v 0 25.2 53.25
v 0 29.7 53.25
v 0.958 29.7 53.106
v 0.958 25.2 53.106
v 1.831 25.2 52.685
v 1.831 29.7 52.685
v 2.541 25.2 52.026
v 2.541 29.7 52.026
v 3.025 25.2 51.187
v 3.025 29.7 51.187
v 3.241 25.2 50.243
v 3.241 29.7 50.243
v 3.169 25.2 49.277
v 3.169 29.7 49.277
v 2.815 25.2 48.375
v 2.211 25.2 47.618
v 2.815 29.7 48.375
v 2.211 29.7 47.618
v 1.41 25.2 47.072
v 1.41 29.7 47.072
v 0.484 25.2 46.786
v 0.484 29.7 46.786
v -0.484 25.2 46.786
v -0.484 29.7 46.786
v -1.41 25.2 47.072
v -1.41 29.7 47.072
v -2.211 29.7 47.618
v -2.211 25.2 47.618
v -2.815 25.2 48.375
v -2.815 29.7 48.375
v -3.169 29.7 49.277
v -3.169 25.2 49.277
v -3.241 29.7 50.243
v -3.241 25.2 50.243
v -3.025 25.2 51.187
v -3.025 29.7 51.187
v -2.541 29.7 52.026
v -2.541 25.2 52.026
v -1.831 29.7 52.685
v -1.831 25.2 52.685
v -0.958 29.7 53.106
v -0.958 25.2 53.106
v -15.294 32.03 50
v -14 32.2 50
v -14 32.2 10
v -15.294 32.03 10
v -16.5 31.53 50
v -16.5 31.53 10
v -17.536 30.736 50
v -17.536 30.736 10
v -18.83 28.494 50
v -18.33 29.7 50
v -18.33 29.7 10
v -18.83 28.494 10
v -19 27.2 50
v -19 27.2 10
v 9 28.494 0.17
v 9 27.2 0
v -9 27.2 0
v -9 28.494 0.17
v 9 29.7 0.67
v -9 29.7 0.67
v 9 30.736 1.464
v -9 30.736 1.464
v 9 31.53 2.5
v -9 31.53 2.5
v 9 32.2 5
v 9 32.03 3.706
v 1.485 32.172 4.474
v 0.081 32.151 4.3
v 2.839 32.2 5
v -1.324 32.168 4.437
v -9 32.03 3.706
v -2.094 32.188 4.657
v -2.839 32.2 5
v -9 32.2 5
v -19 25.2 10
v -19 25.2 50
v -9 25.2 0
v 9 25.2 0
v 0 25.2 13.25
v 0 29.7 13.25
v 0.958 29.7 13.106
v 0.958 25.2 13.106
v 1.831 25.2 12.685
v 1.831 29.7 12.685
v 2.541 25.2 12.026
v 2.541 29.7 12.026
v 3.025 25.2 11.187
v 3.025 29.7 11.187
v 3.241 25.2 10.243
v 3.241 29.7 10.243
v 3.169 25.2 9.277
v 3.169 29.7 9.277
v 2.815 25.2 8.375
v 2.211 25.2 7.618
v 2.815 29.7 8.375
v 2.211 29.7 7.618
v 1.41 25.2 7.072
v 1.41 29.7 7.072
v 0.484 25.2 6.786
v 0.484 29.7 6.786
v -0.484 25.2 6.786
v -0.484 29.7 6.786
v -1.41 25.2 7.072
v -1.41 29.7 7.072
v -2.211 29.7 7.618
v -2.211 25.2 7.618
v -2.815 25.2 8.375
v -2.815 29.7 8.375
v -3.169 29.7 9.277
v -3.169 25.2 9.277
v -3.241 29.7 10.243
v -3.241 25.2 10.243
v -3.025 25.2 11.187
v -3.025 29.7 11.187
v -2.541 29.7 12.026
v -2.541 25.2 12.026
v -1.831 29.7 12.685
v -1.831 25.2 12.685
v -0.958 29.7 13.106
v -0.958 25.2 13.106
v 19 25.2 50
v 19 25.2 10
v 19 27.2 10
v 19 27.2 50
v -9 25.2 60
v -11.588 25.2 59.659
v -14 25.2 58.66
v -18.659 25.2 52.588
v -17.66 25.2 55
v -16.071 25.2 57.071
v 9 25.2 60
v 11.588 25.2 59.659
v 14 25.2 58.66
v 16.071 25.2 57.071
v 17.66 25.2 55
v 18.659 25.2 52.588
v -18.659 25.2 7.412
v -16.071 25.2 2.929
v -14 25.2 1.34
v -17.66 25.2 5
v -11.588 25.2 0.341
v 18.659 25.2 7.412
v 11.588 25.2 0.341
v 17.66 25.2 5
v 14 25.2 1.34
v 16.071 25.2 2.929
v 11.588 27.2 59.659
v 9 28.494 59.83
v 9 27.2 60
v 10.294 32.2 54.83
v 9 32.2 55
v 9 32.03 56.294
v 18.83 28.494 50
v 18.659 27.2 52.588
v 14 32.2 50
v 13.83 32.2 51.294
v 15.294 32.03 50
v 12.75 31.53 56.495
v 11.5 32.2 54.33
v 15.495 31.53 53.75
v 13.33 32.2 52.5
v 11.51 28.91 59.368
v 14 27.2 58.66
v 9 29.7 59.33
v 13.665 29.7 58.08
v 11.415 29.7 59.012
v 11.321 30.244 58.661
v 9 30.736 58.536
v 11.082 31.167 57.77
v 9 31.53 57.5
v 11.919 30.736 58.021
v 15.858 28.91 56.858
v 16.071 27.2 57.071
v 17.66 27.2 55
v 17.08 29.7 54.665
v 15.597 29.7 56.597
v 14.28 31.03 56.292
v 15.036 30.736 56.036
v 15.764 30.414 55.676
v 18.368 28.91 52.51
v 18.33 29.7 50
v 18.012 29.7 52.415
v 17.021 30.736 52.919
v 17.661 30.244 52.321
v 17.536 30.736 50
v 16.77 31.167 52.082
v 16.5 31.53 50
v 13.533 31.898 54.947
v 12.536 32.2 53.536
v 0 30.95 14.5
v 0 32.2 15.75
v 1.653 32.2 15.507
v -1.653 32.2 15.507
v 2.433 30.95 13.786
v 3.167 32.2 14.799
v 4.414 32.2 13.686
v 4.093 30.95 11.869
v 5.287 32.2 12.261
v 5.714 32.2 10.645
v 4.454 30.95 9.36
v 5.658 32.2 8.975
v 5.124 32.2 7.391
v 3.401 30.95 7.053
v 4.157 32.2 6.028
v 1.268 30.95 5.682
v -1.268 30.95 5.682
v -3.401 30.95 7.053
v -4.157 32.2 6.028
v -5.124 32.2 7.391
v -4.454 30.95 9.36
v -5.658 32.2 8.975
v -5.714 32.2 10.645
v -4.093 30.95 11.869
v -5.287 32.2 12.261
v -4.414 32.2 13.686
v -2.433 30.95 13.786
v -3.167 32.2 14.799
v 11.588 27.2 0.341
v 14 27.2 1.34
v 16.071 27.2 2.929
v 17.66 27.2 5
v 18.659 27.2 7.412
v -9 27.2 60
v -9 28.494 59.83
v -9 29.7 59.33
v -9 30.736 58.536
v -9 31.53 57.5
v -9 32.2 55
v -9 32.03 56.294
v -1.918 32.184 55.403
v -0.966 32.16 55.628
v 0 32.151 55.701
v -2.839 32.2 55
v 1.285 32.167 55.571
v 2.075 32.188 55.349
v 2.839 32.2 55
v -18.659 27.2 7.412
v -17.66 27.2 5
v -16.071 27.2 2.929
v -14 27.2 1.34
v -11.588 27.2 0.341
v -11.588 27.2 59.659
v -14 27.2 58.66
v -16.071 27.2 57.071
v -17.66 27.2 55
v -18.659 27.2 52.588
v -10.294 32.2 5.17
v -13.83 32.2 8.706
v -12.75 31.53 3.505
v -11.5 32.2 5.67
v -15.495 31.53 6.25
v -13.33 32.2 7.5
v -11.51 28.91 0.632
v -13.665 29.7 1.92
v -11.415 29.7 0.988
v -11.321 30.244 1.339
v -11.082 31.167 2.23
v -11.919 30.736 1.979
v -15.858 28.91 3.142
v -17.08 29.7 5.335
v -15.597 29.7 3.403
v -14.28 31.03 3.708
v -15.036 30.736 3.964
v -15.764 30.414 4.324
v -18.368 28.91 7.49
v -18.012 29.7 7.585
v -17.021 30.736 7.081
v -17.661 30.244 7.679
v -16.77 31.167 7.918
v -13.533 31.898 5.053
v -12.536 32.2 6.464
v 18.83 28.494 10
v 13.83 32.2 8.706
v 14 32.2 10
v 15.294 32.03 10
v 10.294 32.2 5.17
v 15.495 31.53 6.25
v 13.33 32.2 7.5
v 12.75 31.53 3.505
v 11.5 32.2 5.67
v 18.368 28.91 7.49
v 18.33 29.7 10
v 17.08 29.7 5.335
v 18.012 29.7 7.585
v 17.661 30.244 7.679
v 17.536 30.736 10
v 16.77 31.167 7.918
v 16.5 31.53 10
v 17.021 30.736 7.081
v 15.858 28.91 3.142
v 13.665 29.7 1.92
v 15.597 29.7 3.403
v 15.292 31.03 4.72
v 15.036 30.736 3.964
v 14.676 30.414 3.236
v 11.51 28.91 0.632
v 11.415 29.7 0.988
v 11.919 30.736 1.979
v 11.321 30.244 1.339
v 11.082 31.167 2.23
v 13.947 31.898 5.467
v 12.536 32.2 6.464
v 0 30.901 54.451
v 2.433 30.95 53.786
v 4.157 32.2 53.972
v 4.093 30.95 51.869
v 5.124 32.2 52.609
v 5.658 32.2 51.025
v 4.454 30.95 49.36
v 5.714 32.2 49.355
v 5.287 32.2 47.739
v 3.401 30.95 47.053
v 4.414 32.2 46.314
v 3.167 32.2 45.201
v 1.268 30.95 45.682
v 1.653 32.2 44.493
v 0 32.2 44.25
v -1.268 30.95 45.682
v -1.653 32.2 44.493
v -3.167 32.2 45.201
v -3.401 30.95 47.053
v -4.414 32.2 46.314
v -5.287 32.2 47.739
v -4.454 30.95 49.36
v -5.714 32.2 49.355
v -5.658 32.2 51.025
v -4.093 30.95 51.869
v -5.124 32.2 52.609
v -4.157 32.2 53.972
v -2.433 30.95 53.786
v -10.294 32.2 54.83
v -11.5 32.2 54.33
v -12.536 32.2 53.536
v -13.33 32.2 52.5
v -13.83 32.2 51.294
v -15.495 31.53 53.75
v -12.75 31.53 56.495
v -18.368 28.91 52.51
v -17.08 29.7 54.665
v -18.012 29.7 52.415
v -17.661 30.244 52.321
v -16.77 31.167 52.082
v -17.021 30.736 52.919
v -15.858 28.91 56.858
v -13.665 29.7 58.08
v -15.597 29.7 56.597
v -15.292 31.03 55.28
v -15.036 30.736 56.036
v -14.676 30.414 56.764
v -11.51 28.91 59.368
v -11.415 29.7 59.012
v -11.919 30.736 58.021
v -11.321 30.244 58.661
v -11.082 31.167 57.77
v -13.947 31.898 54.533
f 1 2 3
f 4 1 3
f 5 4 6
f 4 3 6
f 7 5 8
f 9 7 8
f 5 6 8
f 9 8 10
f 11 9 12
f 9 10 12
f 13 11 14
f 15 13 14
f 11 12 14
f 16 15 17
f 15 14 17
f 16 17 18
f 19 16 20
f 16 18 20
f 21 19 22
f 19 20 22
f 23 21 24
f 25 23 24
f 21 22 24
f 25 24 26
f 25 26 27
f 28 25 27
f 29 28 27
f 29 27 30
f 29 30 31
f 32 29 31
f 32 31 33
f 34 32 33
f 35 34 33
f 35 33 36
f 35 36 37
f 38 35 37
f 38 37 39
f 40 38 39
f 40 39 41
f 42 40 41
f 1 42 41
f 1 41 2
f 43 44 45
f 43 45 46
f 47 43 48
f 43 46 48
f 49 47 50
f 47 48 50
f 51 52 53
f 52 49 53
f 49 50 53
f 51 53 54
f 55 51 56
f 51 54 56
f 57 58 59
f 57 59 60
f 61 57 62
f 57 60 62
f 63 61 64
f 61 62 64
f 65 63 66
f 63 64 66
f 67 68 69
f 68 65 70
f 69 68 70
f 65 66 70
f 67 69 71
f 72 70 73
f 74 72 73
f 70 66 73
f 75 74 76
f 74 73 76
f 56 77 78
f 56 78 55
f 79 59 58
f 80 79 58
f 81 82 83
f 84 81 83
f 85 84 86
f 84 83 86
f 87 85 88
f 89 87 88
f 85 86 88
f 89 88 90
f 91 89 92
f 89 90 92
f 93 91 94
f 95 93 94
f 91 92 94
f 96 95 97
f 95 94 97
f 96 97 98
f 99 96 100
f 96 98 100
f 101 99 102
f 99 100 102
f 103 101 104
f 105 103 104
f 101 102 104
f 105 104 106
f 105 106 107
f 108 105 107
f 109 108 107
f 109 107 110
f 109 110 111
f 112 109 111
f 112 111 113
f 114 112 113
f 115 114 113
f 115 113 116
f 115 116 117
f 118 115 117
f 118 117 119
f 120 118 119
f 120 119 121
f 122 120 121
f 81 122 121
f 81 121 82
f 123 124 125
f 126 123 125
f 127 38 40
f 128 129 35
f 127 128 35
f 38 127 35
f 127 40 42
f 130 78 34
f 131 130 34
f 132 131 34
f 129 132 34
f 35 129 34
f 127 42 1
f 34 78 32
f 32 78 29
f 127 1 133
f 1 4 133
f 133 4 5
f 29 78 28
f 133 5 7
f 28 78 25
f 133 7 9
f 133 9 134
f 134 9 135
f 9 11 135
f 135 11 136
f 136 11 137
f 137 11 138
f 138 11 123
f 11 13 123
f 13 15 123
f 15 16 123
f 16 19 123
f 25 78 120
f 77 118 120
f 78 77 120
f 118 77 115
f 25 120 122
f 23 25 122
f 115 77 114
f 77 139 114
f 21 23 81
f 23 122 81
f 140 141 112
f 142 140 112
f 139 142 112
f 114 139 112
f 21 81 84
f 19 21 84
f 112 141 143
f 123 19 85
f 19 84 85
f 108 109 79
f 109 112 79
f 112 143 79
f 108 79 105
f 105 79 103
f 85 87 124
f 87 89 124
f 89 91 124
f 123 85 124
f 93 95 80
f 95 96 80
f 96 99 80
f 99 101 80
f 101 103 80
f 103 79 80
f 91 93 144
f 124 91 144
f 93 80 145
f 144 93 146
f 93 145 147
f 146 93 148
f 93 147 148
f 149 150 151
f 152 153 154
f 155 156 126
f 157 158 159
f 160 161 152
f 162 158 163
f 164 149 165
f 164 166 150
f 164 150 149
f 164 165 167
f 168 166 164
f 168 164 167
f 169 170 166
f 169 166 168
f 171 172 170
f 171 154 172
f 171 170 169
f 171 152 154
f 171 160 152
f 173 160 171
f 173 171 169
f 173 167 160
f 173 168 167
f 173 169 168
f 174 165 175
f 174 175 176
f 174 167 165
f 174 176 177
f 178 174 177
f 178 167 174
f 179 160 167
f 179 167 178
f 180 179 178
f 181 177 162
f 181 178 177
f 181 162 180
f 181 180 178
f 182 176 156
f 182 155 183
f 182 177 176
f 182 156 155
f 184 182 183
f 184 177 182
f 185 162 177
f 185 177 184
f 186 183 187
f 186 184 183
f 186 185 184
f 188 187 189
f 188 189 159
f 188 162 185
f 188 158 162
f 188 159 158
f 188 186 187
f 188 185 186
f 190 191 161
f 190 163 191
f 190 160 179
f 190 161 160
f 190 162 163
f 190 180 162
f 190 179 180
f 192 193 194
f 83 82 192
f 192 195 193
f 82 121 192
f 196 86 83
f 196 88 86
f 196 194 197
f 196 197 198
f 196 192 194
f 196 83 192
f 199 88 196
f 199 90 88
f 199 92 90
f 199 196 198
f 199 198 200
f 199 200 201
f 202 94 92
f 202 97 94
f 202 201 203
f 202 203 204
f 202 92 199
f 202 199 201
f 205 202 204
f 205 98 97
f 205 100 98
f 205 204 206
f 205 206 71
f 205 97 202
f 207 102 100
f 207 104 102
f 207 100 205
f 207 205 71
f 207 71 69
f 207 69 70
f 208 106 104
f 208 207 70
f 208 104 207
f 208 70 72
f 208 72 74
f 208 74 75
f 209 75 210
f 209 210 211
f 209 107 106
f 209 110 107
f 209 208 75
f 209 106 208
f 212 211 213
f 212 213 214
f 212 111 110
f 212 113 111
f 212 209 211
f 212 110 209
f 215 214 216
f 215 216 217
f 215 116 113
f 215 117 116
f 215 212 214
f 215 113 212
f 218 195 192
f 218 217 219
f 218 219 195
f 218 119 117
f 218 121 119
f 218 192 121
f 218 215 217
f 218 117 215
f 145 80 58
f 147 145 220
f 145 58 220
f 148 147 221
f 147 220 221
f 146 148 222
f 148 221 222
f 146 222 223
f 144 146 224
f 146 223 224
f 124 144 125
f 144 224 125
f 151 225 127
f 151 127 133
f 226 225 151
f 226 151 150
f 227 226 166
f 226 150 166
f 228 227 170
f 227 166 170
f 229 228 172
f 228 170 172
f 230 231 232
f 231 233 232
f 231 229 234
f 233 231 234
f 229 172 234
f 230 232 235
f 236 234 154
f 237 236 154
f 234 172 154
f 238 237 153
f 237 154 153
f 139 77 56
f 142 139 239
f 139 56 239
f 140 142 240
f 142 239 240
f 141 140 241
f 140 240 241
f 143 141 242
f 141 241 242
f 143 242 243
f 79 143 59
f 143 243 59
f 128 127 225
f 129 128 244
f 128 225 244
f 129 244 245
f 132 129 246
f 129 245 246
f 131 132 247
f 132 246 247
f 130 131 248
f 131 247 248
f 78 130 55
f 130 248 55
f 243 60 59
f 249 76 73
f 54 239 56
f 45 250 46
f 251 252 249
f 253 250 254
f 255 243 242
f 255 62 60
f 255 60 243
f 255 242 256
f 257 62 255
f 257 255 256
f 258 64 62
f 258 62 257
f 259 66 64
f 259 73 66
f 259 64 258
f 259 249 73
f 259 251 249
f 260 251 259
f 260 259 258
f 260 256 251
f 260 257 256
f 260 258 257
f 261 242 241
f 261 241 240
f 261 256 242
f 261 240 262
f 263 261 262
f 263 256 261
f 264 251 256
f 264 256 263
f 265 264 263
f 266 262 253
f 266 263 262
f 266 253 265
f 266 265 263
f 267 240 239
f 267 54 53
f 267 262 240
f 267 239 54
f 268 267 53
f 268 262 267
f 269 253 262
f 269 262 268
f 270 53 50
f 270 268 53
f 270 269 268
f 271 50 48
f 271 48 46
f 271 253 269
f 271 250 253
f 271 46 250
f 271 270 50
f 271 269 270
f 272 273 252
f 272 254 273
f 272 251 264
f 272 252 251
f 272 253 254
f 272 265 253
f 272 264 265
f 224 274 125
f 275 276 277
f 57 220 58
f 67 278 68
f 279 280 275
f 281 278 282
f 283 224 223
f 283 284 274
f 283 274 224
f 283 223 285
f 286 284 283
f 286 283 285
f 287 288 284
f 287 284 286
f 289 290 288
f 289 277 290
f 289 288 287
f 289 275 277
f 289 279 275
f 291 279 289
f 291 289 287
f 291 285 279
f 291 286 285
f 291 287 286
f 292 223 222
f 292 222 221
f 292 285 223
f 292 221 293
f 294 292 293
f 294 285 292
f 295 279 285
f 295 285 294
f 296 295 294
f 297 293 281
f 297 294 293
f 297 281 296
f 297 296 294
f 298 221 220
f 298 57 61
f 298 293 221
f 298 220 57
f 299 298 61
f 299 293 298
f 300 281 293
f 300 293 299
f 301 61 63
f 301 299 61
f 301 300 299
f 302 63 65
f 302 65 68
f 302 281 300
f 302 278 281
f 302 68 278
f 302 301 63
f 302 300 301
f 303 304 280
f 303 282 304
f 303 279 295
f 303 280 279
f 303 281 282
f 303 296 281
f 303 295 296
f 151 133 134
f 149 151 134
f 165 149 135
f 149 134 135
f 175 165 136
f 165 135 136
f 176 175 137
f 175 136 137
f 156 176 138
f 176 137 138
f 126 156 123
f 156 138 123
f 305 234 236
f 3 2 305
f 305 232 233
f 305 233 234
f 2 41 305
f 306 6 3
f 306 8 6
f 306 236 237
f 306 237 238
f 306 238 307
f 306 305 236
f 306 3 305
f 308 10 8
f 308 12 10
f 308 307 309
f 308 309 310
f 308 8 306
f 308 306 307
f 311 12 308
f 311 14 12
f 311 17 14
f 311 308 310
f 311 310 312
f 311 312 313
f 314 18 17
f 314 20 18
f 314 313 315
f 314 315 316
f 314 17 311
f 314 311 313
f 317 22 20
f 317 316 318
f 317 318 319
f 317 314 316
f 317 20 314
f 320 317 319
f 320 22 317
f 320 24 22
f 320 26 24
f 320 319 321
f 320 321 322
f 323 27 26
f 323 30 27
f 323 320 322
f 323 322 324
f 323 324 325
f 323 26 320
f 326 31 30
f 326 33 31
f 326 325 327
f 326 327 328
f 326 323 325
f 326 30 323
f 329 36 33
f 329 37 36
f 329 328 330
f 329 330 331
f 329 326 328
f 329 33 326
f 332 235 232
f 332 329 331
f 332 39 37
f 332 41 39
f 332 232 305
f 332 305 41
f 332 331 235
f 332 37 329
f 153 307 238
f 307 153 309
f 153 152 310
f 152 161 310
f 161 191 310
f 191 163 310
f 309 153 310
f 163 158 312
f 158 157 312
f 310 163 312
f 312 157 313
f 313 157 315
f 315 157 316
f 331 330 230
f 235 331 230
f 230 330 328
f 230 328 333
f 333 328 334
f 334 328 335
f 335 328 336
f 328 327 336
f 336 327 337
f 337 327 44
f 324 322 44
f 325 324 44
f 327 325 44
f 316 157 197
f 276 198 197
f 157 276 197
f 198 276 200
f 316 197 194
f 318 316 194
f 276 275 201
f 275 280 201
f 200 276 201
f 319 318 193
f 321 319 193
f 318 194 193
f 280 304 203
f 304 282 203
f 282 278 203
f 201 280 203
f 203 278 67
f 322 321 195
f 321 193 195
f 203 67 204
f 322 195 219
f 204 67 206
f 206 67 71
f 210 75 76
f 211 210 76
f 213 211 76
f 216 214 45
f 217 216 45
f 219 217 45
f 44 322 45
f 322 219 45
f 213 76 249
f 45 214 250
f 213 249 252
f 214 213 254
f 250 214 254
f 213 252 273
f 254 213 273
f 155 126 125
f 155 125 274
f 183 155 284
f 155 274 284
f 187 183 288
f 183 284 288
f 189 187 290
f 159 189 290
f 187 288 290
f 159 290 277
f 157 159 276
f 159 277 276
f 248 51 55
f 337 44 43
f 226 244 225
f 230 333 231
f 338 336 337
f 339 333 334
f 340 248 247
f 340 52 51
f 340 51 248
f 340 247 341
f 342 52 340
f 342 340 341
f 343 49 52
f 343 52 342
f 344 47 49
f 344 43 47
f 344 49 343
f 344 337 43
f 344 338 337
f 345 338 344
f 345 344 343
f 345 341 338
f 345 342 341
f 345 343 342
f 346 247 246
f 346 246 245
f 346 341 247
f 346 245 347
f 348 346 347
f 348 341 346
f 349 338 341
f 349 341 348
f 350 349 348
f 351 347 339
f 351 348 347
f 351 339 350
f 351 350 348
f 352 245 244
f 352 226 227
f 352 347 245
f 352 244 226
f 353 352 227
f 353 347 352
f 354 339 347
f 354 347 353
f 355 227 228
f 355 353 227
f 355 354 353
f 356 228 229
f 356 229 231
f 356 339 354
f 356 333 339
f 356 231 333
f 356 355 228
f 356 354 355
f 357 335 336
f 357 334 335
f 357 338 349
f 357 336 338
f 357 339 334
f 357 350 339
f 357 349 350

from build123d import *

# Parameters (mm, degrees)
SKETCH1_W           = 43
SKETCH1_H           = 43
SKETCH1_R           = 13.75
SKETCH1_H_2         = 7
BOSS_EXTRUDE1_DEPTH = 60
SKETCH3_R           = 3.25
CUT_EXTRUDE5_DEPTH  = 85.038324591
CHAMFER2_SIZE       = 2.5
CUT_EXTRUDE6_START  = -38
CUT_EXTRUDE6_DEPTH  = 15
SKETCH9_W           = 10
SKETCH9_H           = 51.2
CUT_EXTRUDE7_DEPTH  = 75.012431469
FILLET1_R           = 5
FILLET2_R           = 10


with BuildPart() as part:
    # Sketch1 → Boss-Extrude1 (new body)
    # profile 1 of 3: a face of its own
    with BuildSketch(Plane.XY):
        with Locations((2.5, 2.5)):
            Rectangle(SKETCH1_W, SKETCH1_H)
        Circle(SKETCH1_R, mode=Mode.SUBTRACT)
    # profile 2 of 3: a face of its own
    with BuildSketch(Plane.XY):
        with Locations((2.5, 28.7)):
            Rectangle(SKETCH1_W, SKETCH1_H_2)
    # profile 3 of 3: a face of its own
    with BuildSketch(Plane.XY):
        Polygon((24, 24), (24, -19), (29, -19), (29, 32.2), (24, 32.2), (24, 25.2), align=None)
    extrude(amount=BOSS_EXTRUDE1_DEPTH)

    # Sketch3 → Cut-Extrude5 (cut, through all)
    with BuildSketch(Plane(origin=(0, 32.2, 0), x_dir=(1, 0, 0), z_dir=(0, 1, 0))):
        with Locations(Location((0, -50, 0), (0, 0, 270))):
            Circle(SKETCH3_R)
        with Locations(Location((0, -10, 0), (0, 0, 270))):
            Circle(SKETCH3_R)
    extrude(amount=-CUT_EXTRUDE5_DEPTH, mode=Mode.SUBTRACT)

    # Chamfer2
    chamfer2_edges = [part.edges().sort_by_distance(p)[0] for p in [
        (0, 32.2, 46.75),
        (0, 32.2, 6.75),
    ]]
    chamfer(chamfer2_edges, length=CHAMFER2_SIZE)

    # Sketch7 → Cut-Extrude6 (cut)
    with BuildSketch(Plane.XZ.offset(19).offset(CUT_EXTRUDE6_START)):
        Polygon((0, 43.533676985), (5.6, 46.766838493), (5.6, 53.233161507), (0, 56.466323015), (-5.6, 53.233161507), (-5.6, 46.766838493), align=None)
        Polygon((-5.6, 13.233161507), (0, 16.466323015), (5.6, 13.233161507), (5.6, 6.766838493), (0, 3.533676985), (-5.6, 6.766838493), align=None)
    extrude(amount=CUT_EXTRUDE6_DEPTH, mode=Mode.SUBTRACT)

    # Sketch9 → Cut-Extrude7 (cut, through all)
    with BuildSketch(Plane(origin=(0, 0, 0), x_dir=(-1, 0, 0), z_dir=(0, 0, -1))):
        with Locations((-24, 6.6)):
            Rectangle(SKETCH9_W, SKETCH9_H)
    extrude(amount=-CUT_EXTRUDE7_DEPTH, mode=Mode.SUBTRACT)


with BuildPart() as body_2:
    # of the pieces the cut leaves, the one that is kept (cut_extrude7_keep)
    add(part.part.solids().sort_by_distance((-19, 32.2, 0))[0])

    # Fillet1
    # the kernel refuses this fillet: 5 mm, written as the material it takes off along each edge
    with BuildSketch(Plane(origin=(-31.5, 32.2, 0), x_dir=(0, 0, 1), z_dir=(1, 0, 0)), Plane(origin=(31.5, 32.2, 60), x_dir=(0, 0, -1), z_dir=(-1, 0, 0))) as fillet1_piece_1:
        with BuildLine():
            CenterArc((FILLET1_R, FILLET1_R), FILLET1_R, 180, 90)
            Line((0, FILLET1_R), (0, 0))
            Line((0, 0), (FILLET1_R, 0))
        make_face()
    extrude(amount=63, mode=Mode.SUBTRACT)
    with BuildSketch(Plane(origin=(-19, 32.2, -12.5), x_dir=(1, 0, 0), z_dir=(0, 0, 1))) as fillet1_piece_2:
        with BuildLine():
            CenterArc((FILLET1_R, -FILLET1_R), FILLET1_R, 90, 90)
            Line((0, -FILLET1_R), (0, 0))
            Line((0, 0), (FILLET1_R, 0))
        make_face()
    extrude(amount=85, mode=Mode.SUBTRACT)
    with BuildSketch(Plane(origin=(19, 32.2, -12.5), x_dir=(-1, 0, 0), z_dir=(0, 0, 1))) as fillet1_piece_3:
        with BuildLine():
            CenterArc((FILLET1_R, FILLET1_R), FILLET1_R, 180, 90)
            Line((0, FILLET1_R), (0, 0))
            Line((0, 0), (FILLET1_R, 0))
        make_face()
    extrude(amount=85, mode=Mode.SUBTRACT)

    # Fillet2
    # the kernel refuses this fillet: 10 mm, written as the material it takes off along each edge
    with BuildSketch(Plane(origin=(-9, 32.2, 10), x_dir=(0, 0, -1), z_dir=(1, 0, 0))) as fillet2_piece_1:
        with BuildLine():
            CenterArc((5, -5), 5, 0, 90)
            Line((10, -5), (10, 0))
            Line((10, 0), (5, 0))
        make_face()
    revolve(axis=Axis((-9, 32.2, 10), (0, 1, 0)), revolution_arc=90, mode=Mode.SUBTRACT)
    with BuildSketch(Plane(origin=(9, 32.2, 10), x_dir=(1, 0, 0), z_dir=(0, 0, 1))) as fillet2_piece_2:
        with BuildLine():
            CenterArc((5, -5), 5, 0, 90)
            Line((10, -5), (10, 0))
            Line((10, 0), (5, 0))
        make_face()
    revolve(axis=Axis((9, 32.2, 10), (0, 1, 0)), revolution_arc=90, mode=Mode.SUBTRACT)
    with BuildSketch(Plane(origin=(-9, 32.2, 50), x_dir=(-1, 0, 0), z_dir=(0, 0, -1))) as fillet2_piece_3:
        with BuildLine():
            CenterArc((5, -5), 5, 0, 90)
            Line((10, -5), (10, 0))
            Line((10, 0), (5, 0))
        make_face()
    revolve(axis=Axis((-9, 32.2, 50), (0, 1, 0)), revolution_arc=90, mode=Mode.SUBTRACT)
    with BuildSketch(Plane(origin=(9, 32.2, 50), x_dir=(0, 0, 1), z_dir=(-1, 0, 0))) as fillet2_piece_4:
        with BuildLine():
            CenterArc((5, -5), 5, 0, 90)
            Line((10, -5), (10, 0))
            Line((10, 0), (5, 0))
        make_face()
    revolve(axis=Axis((9, 32.2, 50), (0, 1, 0)), revolution_arc=90, mode=Mode.SUBTRACT)
    with BuildSketch(Plane(origin=(19, 32.2, 0), x_dir=(0, 0, 1), z_dir=(0, -1, 0)), Plane(origin=(-19, 32.2, 60), x_dir=(0, 0, -1), z_dir=(0, -1, 0))) as fillet2_piece_5:
        with BuildLine():
            CenterArc((FILLET2_R, FILLET2_R), FILLET2_R, 180, 90)
            Line((0, FILLET2_R), (0, 0))
            Line((0, 0), (FILLET2_R, 0))
        make_face()
    extrude(amount=32, mode=Mode.SUBTRACT)
    with BuildSketch(Plane(origin=(19, 0.2, 60), x_dir=(-1, 0, 0), z_dir=(0, 1, 0)), Plane(origin=(-19, 32.2, 0), x_dir=(0, 0, 1), z_dir=(0, -1, 0))) as fillet2_piece_6:
        with BuildLine():
            CenterArc((FILLET2_R, -FILLET2_R), FILLET2_R, 90, 90)
            Line((0, -FILLET2_R), (0, 0))
            Line((0, 0), (FILLET2_R, 0))
        make_face()
    extrude(amount=32, mode=Mode.SUBTRACT)


solid = body_2.part
